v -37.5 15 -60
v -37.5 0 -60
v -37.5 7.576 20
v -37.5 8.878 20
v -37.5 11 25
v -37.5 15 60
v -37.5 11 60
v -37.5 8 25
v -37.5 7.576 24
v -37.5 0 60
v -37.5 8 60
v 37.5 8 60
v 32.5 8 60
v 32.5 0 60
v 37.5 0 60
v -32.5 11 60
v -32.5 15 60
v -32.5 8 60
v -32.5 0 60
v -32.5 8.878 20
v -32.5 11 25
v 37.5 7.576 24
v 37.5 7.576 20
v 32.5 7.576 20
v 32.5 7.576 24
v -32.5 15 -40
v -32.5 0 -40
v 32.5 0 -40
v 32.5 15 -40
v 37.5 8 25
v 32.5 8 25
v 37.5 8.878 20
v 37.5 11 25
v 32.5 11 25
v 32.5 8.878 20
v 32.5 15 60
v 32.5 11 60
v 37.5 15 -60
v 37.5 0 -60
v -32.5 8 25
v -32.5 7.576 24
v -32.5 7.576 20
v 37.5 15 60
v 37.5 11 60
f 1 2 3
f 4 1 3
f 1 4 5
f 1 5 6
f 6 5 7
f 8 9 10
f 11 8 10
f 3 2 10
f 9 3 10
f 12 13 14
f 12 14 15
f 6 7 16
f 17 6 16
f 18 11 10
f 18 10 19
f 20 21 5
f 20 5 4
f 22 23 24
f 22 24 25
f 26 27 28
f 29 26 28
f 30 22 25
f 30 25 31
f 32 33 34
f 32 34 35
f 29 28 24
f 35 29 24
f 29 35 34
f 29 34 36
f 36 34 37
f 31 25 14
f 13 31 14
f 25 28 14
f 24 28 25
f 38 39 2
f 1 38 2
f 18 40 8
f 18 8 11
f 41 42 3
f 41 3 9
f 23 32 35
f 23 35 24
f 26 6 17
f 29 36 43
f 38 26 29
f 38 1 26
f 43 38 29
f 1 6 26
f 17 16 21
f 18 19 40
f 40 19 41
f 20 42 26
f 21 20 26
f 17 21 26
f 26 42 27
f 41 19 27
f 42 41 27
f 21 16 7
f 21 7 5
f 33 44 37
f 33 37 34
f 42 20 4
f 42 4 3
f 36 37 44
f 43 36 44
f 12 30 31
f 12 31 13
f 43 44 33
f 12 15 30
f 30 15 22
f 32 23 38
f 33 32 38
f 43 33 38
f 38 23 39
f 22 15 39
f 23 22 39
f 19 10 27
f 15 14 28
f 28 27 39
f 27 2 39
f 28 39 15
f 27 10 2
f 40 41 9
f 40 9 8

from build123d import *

# Parameters (mm, degrees)
BOSS_EXTRUDE1_DEPTH = 15
CUT_EXTRUDE1_DEPTH  = 37.5


with BuildPart() as part:
    # Sketch1 → Boss-Extrude1 (new body)
    with BuildSketch(Plane(origin=(0, 0, 0), x_dir=(1, 0, 0), z_dir=(0, 1, 0))):
        Polygon((32.5, -60), (37.5, -60), (37.5, 60), (-37.5, 60), (-37.5, -60), (-32.5, -60), (-32.5, 40), (32.5, 40), align=None)
    extrude(amount=BOSS_EXTRUDE1_DEPTH)

    # Sketch2 → Cut-Extrude1 (cut, symmetric)
    with BuildSketch(Plane(origin=(0, 0, 0), x_dir=(0, 0, -1), z_dir=(1, 0, 0))):
        Polygon((-60, 11), (-25, 11), (-20, 8.877625919), (-20, 7.575525184), (-24, 7.575525184), (-25, 8), (-60, 8), align=None)
    extrude(amount=CUT_EXTRUDE1_DEPTH, both=True, mode=Mode.SUBTRACT)


solid = part.part
